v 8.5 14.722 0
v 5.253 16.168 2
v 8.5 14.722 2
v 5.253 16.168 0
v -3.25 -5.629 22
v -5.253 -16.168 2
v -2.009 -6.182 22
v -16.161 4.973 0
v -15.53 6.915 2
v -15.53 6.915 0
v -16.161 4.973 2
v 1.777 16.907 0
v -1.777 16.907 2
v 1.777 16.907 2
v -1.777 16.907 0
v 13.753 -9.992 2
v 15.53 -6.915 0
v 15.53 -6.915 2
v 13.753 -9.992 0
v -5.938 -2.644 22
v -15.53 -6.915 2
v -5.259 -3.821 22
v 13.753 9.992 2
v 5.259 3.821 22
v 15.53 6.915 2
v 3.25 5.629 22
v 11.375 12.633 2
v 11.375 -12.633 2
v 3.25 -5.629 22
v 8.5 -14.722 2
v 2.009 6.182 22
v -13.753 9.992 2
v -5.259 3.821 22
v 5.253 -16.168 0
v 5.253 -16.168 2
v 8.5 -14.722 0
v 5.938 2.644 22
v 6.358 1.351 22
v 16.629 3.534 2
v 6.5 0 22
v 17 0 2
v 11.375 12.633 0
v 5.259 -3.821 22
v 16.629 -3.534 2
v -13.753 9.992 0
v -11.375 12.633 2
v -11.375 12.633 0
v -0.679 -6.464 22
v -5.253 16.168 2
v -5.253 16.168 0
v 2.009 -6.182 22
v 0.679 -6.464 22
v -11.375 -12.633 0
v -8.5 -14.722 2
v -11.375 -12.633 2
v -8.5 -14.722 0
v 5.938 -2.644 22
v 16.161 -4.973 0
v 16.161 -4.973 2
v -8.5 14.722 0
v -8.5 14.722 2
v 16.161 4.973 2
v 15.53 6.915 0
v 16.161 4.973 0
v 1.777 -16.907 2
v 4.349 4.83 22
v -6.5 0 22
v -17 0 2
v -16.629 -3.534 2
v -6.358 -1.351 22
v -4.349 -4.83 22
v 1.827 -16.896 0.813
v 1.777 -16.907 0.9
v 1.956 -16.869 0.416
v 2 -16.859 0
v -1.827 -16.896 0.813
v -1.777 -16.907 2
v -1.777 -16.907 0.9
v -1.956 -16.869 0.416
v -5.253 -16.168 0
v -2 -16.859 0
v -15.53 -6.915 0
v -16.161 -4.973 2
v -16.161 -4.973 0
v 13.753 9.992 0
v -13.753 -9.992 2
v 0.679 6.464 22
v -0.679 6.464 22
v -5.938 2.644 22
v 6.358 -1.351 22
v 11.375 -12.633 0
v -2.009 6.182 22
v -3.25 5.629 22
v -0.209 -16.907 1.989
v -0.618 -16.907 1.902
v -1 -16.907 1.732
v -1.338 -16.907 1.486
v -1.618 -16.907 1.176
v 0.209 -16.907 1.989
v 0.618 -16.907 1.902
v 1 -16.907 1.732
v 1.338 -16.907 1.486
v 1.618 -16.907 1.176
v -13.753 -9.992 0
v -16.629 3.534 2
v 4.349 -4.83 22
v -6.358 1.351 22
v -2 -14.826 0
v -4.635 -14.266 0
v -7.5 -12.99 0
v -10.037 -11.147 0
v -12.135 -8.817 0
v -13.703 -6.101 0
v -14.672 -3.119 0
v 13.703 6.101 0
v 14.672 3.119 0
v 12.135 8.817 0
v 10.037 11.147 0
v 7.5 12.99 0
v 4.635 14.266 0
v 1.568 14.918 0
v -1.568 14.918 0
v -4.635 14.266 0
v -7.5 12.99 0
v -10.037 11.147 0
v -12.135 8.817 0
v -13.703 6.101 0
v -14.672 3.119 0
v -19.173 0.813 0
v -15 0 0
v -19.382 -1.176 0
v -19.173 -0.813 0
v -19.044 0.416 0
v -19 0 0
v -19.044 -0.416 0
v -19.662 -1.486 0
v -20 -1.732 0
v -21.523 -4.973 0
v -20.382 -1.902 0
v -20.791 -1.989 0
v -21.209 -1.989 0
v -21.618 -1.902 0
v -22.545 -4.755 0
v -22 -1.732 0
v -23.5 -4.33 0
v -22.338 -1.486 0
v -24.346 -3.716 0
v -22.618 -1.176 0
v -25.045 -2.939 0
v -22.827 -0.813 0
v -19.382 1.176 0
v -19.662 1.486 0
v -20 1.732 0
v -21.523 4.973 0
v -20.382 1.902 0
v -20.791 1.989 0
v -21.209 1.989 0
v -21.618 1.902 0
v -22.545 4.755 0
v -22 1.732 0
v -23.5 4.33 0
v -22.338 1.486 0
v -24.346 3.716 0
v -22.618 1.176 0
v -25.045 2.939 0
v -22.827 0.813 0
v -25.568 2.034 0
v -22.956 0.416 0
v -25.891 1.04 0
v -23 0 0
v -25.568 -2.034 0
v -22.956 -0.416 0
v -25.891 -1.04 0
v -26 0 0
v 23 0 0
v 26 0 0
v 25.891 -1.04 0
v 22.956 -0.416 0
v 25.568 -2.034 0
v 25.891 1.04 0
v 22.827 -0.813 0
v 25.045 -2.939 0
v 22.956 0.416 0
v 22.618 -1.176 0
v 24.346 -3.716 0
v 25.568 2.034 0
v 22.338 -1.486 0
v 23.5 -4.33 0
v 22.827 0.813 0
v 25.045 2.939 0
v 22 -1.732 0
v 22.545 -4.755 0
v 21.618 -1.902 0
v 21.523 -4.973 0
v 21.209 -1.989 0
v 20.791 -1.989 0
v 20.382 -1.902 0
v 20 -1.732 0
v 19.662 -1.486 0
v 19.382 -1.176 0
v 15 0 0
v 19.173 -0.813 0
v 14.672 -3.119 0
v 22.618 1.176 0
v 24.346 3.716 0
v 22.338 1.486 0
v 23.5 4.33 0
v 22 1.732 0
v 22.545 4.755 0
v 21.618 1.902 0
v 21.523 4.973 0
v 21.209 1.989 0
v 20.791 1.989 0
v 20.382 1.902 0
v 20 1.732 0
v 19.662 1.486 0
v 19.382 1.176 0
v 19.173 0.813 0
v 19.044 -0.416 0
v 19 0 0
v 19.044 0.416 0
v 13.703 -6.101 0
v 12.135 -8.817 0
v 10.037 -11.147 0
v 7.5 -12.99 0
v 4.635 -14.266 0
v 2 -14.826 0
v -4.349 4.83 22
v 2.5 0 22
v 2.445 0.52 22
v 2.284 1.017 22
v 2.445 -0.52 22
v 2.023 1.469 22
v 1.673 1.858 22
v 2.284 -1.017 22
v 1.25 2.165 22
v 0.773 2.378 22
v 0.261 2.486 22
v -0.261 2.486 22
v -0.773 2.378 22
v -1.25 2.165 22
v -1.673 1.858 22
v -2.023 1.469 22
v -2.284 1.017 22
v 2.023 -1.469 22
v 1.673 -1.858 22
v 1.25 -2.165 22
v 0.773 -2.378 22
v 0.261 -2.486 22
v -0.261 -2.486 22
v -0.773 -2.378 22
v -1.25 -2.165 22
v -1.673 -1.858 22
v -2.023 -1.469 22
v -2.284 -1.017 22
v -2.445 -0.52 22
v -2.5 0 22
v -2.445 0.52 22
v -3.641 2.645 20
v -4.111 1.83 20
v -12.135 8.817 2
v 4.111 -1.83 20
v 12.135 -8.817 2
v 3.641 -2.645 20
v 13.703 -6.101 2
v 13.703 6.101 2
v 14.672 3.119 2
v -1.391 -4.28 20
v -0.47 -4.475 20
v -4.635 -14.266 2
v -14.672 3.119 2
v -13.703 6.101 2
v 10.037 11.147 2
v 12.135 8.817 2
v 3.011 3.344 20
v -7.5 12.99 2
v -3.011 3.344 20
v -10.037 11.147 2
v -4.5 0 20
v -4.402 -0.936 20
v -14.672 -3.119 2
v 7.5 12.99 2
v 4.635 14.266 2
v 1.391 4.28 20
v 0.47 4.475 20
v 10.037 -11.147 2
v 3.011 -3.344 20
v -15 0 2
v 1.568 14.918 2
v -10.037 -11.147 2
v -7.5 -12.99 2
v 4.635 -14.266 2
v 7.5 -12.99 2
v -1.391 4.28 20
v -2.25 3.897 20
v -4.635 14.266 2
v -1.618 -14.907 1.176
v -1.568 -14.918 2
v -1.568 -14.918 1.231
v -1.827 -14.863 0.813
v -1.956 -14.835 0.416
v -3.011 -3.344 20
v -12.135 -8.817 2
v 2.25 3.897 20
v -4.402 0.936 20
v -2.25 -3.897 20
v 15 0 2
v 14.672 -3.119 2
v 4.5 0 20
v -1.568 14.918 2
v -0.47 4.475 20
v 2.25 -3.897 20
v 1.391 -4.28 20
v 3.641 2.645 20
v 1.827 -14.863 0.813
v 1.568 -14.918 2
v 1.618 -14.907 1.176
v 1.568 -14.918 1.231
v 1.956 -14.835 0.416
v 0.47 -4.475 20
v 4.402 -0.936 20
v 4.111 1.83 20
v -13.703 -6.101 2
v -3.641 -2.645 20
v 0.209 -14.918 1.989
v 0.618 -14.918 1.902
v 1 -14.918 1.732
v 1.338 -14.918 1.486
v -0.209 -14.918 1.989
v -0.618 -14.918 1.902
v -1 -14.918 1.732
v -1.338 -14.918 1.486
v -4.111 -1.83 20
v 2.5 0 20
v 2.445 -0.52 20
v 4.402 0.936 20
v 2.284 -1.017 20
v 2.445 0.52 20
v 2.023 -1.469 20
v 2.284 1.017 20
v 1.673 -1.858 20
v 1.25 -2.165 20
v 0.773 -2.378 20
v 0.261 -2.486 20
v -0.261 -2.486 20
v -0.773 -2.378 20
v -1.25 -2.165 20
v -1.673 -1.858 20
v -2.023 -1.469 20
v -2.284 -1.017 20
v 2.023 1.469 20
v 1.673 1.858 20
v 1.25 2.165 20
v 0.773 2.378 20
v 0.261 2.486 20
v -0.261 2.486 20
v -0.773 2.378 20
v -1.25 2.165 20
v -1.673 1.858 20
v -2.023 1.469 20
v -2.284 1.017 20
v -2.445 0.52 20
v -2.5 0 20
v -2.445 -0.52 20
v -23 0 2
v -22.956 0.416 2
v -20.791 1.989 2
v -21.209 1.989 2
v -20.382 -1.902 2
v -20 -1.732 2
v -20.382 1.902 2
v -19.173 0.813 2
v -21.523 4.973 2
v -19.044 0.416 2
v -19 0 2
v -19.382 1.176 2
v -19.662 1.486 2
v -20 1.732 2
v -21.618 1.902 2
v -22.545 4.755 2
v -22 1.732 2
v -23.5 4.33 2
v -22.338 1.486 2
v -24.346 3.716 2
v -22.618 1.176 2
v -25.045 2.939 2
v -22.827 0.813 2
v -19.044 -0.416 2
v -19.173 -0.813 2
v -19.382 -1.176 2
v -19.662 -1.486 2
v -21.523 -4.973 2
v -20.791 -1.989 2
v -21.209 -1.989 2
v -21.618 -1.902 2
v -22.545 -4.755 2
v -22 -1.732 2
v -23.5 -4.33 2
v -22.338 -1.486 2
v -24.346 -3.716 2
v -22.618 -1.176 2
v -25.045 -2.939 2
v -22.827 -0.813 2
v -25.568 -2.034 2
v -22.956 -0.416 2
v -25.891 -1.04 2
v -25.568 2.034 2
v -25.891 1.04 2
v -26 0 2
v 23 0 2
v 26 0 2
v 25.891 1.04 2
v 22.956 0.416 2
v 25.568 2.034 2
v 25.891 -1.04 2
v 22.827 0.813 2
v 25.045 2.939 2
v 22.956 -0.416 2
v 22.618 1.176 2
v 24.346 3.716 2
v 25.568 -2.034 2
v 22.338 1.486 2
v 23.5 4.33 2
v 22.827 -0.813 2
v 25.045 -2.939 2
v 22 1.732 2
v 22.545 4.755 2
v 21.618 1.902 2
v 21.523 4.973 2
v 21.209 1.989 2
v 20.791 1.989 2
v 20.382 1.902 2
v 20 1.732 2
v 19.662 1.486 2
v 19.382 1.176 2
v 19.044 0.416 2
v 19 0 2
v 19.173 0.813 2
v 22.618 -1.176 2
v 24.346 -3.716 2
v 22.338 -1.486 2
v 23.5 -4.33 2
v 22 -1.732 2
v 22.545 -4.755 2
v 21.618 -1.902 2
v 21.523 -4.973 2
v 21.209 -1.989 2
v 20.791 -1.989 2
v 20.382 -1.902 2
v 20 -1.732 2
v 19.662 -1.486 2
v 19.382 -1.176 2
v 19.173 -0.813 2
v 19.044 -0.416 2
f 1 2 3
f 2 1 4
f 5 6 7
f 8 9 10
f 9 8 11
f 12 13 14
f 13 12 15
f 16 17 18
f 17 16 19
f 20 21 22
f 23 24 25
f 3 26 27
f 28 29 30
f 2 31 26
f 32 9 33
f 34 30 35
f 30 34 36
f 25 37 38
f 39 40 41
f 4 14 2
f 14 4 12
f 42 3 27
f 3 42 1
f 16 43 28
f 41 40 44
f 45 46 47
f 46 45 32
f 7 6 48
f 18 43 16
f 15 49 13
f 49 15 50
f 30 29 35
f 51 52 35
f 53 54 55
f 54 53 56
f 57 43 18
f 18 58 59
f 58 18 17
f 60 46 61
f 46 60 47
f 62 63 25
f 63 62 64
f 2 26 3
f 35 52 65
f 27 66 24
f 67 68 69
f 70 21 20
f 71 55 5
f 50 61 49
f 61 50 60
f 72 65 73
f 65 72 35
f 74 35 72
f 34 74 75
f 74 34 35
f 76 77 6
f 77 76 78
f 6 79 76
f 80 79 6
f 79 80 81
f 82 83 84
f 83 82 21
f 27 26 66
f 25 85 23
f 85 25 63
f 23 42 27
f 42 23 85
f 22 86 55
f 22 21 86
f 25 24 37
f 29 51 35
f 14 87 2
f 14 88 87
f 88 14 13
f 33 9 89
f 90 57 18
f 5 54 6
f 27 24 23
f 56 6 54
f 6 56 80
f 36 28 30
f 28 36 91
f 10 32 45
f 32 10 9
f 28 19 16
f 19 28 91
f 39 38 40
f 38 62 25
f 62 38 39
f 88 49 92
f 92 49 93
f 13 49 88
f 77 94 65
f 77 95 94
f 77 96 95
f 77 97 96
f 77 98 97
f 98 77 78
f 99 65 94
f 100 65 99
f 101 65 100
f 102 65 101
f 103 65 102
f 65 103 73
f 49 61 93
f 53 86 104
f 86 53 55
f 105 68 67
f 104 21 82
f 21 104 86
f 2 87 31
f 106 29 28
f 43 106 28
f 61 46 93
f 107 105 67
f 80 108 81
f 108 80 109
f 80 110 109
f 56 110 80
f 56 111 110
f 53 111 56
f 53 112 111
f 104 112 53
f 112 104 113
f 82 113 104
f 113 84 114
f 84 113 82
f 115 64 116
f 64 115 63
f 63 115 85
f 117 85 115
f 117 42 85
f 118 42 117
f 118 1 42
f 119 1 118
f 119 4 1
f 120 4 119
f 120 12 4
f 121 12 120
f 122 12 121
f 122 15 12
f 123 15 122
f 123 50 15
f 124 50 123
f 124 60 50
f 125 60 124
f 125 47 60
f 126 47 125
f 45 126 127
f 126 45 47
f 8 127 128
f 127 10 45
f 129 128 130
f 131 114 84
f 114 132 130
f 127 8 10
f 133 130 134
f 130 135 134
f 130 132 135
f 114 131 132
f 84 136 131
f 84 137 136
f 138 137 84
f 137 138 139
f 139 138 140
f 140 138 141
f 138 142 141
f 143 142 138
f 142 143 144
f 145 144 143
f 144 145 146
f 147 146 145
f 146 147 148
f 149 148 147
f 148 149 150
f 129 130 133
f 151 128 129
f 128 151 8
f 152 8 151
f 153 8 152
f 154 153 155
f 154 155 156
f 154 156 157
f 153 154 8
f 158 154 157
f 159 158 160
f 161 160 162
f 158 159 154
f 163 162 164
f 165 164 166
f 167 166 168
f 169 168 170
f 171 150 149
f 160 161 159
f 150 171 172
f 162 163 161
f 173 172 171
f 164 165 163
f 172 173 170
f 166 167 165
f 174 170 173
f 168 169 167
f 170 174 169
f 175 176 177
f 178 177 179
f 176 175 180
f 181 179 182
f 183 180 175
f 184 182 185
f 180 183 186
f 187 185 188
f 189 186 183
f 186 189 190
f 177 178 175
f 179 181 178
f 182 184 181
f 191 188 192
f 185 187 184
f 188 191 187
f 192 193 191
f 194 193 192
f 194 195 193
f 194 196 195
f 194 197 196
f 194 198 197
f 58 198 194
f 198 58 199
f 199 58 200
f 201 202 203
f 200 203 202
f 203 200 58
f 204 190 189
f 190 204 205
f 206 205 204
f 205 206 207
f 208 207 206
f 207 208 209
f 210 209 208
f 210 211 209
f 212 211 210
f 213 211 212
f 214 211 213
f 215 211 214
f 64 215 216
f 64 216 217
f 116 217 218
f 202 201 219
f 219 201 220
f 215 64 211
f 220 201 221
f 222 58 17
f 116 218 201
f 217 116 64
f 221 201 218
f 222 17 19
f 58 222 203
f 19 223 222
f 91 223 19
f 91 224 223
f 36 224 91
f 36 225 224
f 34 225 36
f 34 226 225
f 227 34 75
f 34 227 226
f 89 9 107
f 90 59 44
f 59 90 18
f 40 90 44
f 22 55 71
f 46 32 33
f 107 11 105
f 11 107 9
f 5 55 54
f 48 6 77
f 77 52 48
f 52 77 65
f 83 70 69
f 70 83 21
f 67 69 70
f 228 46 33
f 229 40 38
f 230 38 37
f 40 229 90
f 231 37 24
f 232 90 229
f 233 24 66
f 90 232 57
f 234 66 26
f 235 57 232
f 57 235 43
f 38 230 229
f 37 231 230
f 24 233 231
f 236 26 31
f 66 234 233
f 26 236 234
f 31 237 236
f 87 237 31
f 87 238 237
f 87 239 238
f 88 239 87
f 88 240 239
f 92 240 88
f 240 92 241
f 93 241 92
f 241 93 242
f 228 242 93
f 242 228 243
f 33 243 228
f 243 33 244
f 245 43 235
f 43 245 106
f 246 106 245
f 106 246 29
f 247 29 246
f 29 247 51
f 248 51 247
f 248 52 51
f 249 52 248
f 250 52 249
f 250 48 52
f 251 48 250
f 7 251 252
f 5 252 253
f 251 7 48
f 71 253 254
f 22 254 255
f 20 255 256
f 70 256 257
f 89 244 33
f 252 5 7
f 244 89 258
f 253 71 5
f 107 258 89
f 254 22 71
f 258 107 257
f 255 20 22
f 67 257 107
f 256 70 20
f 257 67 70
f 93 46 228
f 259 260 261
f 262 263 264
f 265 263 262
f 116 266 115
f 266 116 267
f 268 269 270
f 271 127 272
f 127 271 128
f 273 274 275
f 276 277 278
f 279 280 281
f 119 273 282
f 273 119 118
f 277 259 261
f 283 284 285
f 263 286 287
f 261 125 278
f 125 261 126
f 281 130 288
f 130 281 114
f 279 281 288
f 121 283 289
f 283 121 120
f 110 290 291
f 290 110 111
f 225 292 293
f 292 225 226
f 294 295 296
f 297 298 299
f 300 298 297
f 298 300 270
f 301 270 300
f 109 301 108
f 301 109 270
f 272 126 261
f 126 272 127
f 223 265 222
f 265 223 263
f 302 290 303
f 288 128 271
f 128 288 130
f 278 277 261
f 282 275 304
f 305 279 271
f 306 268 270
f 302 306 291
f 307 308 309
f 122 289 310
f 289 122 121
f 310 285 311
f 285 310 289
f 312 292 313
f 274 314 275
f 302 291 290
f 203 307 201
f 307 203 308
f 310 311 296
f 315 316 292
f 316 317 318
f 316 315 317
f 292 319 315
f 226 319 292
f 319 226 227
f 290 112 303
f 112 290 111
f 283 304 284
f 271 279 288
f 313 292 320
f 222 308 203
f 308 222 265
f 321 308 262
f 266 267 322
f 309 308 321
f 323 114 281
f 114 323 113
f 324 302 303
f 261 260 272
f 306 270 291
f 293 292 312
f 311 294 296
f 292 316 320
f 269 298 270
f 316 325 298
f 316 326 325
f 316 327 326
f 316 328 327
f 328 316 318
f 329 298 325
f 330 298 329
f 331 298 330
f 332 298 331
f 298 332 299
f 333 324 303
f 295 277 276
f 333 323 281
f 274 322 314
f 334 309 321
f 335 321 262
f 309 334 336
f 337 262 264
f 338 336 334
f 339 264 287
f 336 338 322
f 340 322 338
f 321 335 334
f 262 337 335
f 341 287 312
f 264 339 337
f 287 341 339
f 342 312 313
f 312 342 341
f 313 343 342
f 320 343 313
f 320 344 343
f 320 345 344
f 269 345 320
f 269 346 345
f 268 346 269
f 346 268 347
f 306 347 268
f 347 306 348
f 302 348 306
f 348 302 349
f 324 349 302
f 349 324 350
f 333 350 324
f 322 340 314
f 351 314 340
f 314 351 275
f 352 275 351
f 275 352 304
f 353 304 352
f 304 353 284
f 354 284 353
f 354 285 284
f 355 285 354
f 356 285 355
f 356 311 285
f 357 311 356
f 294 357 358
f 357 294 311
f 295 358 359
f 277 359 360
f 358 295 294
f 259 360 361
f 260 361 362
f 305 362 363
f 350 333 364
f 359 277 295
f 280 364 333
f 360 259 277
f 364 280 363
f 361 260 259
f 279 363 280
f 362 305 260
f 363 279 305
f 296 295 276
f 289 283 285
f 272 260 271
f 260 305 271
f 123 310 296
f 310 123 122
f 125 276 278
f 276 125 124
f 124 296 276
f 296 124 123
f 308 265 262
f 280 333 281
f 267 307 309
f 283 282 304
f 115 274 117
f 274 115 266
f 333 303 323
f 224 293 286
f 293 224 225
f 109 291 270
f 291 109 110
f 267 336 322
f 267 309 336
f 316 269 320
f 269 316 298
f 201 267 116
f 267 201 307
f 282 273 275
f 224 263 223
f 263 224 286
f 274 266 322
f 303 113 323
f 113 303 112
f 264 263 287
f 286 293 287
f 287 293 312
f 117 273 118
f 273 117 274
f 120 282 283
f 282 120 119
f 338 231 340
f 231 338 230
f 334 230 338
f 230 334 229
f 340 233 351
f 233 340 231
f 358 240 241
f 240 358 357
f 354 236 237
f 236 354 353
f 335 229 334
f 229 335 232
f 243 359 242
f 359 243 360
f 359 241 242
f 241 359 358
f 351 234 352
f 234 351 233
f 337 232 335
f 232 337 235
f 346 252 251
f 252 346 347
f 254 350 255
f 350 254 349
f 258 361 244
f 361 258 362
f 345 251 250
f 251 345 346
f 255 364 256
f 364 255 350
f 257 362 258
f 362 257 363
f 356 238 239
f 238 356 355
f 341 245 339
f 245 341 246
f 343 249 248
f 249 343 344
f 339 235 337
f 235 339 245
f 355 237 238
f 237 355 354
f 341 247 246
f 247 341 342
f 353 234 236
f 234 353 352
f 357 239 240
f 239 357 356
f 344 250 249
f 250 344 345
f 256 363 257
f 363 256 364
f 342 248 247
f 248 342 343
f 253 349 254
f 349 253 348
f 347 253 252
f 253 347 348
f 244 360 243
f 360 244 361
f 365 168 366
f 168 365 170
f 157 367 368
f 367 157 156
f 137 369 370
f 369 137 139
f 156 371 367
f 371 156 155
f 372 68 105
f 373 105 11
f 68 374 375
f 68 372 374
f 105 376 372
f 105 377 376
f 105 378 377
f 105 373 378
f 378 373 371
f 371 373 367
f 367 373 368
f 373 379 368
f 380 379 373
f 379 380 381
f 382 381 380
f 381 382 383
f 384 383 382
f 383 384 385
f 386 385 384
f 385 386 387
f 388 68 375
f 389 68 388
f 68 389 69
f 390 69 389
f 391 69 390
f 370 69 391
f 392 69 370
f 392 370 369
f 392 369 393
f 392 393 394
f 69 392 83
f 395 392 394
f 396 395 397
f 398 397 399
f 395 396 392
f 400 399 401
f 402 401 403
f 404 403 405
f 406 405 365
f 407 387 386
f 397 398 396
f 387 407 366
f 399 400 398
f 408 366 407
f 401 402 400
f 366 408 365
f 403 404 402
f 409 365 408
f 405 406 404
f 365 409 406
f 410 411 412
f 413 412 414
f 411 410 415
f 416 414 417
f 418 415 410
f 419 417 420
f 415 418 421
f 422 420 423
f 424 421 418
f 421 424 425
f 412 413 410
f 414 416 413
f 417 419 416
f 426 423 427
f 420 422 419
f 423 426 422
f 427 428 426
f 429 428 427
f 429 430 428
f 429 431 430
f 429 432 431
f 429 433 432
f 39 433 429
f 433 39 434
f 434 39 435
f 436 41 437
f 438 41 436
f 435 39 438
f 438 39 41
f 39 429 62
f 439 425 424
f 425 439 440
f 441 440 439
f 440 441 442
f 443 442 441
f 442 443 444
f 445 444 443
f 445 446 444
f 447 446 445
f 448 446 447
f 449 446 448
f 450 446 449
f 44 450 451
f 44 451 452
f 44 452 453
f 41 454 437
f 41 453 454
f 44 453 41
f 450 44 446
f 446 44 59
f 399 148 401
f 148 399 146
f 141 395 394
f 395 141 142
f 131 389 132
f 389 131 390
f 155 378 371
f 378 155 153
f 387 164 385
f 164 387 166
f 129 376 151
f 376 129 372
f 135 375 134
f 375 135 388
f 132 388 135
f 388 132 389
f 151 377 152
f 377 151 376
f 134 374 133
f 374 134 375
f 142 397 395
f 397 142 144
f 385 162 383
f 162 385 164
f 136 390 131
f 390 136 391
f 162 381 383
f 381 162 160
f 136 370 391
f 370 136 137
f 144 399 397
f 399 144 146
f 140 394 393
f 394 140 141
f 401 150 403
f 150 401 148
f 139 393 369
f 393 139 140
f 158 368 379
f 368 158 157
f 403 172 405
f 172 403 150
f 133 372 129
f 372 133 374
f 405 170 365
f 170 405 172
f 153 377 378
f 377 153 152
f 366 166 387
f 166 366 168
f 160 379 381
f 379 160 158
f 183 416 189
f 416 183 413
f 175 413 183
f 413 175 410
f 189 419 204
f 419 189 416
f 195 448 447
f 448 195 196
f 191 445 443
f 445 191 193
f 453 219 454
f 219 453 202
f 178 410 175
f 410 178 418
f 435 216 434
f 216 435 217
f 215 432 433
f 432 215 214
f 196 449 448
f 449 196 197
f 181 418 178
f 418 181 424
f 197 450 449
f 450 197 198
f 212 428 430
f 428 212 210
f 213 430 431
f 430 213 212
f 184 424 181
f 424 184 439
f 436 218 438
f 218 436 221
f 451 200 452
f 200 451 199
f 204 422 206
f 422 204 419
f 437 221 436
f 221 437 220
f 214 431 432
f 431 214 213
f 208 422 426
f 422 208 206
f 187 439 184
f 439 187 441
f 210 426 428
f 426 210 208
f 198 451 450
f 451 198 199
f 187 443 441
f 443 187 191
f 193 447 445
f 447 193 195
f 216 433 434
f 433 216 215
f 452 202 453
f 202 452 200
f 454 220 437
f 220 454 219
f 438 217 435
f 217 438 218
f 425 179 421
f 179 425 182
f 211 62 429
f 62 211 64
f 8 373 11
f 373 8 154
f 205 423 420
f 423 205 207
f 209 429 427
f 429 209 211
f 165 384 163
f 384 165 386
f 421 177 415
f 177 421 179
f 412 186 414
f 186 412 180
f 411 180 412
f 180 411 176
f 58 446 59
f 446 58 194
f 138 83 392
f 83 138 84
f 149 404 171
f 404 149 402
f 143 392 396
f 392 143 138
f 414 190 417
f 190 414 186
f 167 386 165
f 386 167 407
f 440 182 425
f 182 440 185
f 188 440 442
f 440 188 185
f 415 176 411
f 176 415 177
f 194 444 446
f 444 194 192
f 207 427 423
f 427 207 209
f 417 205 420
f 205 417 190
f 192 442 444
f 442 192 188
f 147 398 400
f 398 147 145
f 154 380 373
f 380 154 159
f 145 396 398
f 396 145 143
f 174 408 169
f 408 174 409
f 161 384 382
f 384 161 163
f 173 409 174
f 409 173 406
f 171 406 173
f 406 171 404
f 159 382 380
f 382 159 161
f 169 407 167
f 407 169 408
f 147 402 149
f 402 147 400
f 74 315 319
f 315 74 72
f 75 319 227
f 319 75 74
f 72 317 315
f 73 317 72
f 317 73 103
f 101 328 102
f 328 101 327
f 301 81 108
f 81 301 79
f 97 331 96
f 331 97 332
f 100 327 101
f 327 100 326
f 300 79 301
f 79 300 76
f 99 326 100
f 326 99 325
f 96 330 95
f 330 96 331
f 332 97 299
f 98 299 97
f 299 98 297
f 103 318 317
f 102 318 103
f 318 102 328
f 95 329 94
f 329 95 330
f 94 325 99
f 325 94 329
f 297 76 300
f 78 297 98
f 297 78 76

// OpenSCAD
module led_mount(
    h,
    led_r,
    base_r,
    fastener_r,
    fastener_head_r,
    thickness,
    inclination,
    cable_r
) {
    led_gap = 2;
    difference() {
        union() {
            difference() {
                difference() {
                    hull() {
                        rotate(inclination, [1,0,0])
                        translate([0,0,h])
                        cylinder(h = thickness, r = led_r + thickness + led_gap);
                        cylinder(h = thickness, r = base_r + thickness);
                    }
                    hull() {
                        rotate(inclination, [1,0,0])
                        translate([0,0,h - thickness])
                        cylinder(h = thickness, r = led_r + led_gap);
                        cylinder(h = thickness, r = base_r);
                    }
                }
                rotate(inclination, [1,0,0])
                translate([0,0,h])
                cylinder(h = thickness + 1, r = led_r);
            }

            difference() {
                difference() {
                    hull() {
                        mirror([1,0,0])
                        translate([base_r + fastener_r * 2 + thickness, 0, 0])
                        cylinder(h = thickness, r = fastener_head_r);
                        translate([base_r + fastener_r * 2 + thickness, 0, 0])
                        cylinder(h = thickness, r = fastener_head_r);
                    }
                    union() {
                        mirror([1,0,0])
                        translate([base_r + fastener_r * 2 + thickness, 0, 0])
                        cylinder(h = thickness, r = fastener_r);
                        translate([base_r + fastener_r * 2 + thickness, 0, 0])
                        cylinder(h = thickness, r = fastener_r);
                    }
                }
                cylinder(h = thickness, r = base_r);
            }
        }
        rotate(90, [1,0,0])
        cylinder(h = base_r + thickness, r = cable_r);
    }
}


led_mount(
    $fn=30,
    h = 20,
    cable_r = 2,
    led_r = 2.5,
    base_r = 15,
    fastener_r = 2,
    fastener_head_r = 5,
    thickness = 2,
    inclination = 0
);
